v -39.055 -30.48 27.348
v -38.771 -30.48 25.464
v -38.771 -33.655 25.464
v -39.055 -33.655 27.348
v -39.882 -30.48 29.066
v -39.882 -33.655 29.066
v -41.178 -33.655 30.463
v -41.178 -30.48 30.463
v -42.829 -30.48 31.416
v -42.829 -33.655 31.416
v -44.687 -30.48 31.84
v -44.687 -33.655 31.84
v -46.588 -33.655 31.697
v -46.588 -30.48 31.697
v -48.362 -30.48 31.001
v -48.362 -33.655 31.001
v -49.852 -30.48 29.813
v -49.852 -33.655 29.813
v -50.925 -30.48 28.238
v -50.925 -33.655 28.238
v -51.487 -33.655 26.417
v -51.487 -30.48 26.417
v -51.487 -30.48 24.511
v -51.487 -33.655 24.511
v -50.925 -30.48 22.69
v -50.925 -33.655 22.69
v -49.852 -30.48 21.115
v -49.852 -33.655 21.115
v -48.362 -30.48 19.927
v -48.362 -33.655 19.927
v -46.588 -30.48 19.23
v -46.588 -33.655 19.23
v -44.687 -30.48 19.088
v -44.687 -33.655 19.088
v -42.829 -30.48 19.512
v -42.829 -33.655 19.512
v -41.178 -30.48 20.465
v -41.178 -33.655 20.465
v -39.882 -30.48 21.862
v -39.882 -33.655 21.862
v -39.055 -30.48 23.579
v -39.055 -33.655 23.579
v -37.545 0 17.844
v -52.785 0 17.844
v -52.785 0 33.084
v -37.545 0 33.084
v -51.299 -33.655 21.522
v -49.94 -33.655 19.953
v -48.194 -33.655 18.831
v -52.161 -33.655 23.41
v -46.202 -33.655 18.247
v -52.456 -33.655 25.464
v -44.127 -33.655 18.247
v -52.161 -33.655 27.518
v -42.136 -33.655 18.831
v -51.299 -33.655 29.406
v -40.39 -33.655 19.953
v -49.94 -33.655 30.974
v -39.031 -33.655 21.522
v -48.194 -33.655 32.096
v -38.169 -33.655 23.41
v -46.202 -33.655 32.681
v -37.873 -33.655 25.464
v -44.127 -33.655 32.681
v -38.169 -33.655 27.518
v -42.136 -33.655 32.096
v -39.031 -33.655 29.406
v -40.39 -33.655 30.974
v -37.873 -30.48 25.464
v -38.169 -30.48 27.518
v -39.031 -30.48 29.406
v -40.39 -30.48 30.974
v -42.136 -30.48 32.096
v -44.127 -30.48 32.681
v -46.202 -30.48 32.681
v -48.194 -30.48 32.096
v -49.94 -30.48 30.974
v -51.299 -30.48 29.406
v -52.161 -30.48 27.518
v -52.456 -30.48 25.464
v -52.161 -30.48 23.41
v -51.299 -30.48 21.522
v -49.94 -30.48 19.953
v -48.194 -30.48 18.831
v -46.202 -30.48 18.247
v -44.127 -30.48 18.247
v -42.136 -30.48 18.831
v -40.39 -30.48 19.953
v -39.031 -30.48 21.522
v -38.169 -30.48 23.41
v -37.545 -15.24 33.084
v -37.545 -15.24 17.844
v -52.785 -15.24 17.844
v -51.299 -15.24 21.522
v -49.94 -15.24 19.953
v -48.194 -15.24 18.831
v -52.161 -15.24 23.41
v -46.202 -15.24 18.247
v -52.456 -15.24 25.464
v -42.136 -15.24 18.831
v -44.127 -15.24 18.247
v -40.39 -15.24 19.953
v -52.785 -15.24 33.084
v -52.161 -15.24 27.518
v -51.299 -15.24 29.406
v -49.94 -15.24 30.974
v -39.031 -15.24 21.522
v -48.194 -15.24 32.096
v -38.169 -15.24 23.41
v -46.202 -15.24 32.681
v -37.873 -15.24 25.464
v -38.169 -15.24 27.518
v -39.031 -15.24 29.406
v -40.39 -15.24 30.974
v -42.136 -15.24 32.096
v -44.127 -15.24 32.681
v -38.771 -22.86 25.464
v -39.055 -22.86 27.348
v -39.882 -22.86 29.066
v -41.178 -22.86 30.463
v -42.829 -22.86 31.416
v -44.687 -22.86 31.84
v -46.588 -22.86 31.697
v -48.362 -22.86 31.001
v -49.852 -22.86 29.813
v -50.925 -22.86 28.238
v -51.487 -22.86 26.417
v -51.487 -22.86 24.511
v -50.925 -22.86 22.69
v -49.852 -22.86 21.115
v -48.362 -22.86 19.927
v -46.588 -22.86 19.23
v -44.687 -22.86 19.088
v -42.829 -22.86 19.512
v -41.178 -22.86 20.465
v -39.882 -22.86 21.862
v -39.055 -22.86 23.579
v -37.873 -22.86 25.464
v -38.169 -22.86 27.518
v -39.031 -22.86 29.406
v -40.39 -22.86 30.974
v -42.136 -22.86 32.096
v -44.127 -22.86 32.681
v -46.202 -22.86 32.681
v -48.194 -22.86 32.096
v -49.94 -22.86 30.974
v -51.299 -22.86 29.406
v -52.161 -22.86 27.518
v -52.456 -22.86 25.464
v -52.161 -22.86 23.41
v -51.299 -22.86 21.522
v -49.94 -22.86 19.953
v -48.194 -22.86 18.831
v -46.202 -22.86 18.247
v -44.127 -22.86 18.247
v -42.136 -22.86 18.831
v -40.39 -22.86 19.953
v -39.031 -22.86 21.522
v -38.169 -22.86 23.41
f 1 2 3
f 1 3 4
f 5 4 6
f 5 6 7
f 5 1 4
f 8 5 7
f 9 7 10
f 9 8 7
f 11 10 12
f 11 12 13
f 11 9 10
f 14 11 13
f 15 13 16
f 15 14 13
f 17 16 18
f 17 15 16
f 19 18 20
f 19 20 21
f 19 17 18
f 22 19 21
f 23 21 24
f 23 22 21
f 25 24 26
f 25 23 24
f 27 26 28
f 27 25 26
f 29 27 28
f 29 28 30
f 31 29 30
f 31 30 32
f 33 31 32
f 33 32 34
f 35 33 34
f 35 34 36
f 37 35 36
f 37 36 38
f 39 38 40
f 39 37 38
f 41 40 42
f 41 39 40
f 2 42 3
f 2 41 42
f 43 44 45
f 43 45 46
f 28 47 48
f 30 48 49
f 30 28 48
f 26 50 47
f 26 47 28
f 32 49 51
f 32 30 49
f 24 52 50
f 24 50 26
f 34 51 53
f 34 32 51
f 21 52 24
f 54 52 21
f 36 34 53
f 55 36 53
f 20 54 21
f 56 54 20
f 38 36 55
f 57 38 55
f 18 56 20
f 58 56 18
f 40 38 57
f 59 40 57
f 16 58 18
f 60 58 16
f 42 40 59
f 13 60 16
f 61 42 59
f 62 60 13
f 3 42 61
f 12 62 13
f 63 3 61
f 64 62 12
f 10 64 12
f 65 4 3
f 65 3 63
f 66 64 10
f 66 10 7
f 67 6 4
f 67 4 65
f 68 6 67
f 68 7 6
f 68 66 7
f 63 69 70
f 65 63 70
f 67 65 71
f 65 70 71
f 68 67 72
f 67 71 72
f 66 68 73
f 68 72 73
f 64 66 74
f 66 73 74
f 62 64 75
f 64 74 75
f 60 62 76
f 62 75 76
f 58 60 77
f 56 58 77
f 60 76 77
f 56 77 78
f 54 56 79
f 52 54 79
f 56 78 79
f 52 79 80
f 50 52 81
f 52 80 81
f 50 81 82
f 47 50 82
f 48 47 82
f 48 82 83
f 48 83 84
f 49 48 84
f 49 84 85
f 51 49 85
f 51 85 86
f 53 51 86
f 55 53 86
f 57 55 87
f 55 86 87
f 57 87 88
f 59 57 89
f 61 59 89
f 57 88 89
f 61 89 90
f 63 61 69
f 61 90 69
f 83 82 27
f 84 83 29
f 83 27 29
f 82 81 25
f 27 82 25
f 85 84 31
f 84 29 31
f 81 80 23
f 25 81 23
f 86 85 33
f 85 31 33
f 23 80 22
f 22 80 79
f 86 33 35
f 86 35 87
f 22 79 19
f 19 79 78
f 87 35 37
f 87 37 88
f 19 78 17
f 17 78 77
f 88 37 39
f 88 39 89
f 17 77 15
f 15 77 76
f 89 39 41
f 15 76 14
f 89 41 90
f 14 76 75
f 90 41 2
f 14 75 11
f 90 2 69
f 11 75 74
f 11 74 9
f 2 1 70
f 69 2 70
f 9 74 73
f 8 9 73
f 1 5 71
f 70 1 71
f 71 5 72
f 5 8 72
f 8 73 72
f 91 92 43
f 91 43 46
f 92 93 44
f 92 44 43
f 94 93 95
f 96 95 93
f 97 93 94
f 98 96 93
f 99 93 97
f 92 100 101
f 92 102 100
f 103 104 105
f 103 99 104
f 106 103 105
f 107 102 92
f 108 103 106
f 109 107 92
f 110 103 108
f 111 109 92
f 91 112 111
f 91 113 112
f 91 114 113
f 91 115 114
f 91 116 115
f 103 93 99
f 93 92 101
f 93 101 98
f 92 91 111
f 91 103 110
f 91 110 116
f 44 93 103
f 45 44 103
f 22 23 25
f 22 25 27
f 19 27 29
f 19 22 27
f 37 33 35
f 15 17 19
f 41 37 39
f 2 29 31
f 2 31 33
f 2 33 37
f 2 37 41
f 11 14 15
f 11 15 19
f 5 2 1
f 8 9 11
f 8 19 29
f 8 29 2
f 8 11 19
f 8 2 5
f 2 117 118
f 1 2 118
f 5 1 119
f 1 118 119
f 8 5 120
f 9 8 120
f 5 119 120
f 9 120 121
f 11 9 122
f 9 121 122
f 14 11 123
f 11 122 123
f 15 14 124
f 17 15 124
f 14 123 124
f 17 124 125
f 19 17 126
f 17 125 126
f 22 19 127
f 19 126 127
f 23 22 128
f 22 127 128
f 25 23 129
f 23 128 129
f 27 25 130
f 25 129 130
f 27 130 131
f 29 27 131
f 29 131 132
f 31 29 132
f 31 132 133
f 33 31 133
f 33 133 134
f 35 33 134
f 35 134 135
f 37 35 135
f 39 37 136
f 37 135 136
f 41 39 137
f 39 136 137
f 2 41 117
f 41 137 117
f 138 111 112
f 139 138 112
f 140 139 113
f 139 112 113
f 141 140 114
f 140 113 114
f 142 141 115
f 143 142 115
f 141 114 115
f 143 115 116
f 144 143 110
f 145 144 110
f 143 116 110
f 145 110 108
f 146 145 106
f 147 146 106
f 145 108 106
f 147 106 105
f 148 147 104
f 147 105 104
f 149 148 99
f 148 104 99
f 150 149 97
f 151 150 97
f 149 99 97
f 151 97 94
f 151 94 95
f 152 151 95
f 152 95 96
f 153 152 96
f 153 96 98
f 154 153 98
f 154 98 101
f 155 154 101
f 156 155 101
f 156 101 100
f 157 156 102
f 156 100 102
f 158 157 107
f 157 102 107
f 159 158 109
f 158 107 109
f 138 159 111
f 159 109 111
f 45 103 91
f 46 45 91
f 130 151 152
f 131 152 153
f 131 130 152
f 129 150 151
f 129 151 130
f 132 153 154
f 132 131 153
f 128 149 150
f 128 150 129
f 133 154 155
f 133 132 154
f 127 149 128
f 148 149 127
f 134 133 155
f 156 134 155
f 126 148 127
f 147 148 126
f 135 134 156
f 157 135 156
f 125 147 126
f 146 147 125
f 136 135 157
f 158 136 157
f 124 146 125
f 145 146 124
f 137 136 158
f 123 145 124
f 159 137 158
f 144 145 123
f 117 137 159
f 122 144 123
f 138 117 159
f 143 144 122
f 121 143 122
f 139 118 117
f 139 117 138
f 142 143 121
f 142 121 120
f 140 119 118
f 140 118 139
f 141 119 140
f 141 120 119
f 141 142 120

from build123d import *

# Parameters (mm, degrees)
F0_W     = 15.24
F0_H     = 15.24
F1_DEPTH = 15.24
F2_R     = 7.291482
F3_DEPTH = 7.62
F4_R     = 6.393757
F5_DEPTH = 7.62
F6_R     = 7.291482
F6_R_2   = 6.393757
F7_DEPTH = 3.175


with BuildPart() as f1:
    # F0 (on Front) → F1 (new body)
    with BuildSketch(Plane.XZ):
        with Locations((-45.164775, 25.46382)):
            Rectangle(F0_W, F0_H)
    extrude(amount=F1_DEPTH)

    # F2 (on face) → F3 (join)
    with BuildSketch(Plane.XZ.offset(15.24)):
        with Locations((-45.164775, 25.46382)):
            Circle(F2_R)
    extrude(amount=F3_DEPTH)

    # F4 (on face) → F5 (join)
    with BuildSketch(Plane.XZ.offset(22.86)):
        with Locations((-45.164775, 25.46382)):
            Circle(F4_R)
    extrude(amount=F5_DEPTH)


with BuildPart() as f7:
    # F6 (on face) → F7 (new body)
    with BuildSketch(Plane.XZ.offset(30.48)):
        with Locations((-45.164775, 25.46382)):
            Circle(F6_R)
        with Locations((-45.164775, 25.46382)):
            Circle(F6_R_2, mode=Mode.SUBTRACT)
    extrude(amount=F7_DEPTH)


solid = Compound([f1.part, f7.part])
